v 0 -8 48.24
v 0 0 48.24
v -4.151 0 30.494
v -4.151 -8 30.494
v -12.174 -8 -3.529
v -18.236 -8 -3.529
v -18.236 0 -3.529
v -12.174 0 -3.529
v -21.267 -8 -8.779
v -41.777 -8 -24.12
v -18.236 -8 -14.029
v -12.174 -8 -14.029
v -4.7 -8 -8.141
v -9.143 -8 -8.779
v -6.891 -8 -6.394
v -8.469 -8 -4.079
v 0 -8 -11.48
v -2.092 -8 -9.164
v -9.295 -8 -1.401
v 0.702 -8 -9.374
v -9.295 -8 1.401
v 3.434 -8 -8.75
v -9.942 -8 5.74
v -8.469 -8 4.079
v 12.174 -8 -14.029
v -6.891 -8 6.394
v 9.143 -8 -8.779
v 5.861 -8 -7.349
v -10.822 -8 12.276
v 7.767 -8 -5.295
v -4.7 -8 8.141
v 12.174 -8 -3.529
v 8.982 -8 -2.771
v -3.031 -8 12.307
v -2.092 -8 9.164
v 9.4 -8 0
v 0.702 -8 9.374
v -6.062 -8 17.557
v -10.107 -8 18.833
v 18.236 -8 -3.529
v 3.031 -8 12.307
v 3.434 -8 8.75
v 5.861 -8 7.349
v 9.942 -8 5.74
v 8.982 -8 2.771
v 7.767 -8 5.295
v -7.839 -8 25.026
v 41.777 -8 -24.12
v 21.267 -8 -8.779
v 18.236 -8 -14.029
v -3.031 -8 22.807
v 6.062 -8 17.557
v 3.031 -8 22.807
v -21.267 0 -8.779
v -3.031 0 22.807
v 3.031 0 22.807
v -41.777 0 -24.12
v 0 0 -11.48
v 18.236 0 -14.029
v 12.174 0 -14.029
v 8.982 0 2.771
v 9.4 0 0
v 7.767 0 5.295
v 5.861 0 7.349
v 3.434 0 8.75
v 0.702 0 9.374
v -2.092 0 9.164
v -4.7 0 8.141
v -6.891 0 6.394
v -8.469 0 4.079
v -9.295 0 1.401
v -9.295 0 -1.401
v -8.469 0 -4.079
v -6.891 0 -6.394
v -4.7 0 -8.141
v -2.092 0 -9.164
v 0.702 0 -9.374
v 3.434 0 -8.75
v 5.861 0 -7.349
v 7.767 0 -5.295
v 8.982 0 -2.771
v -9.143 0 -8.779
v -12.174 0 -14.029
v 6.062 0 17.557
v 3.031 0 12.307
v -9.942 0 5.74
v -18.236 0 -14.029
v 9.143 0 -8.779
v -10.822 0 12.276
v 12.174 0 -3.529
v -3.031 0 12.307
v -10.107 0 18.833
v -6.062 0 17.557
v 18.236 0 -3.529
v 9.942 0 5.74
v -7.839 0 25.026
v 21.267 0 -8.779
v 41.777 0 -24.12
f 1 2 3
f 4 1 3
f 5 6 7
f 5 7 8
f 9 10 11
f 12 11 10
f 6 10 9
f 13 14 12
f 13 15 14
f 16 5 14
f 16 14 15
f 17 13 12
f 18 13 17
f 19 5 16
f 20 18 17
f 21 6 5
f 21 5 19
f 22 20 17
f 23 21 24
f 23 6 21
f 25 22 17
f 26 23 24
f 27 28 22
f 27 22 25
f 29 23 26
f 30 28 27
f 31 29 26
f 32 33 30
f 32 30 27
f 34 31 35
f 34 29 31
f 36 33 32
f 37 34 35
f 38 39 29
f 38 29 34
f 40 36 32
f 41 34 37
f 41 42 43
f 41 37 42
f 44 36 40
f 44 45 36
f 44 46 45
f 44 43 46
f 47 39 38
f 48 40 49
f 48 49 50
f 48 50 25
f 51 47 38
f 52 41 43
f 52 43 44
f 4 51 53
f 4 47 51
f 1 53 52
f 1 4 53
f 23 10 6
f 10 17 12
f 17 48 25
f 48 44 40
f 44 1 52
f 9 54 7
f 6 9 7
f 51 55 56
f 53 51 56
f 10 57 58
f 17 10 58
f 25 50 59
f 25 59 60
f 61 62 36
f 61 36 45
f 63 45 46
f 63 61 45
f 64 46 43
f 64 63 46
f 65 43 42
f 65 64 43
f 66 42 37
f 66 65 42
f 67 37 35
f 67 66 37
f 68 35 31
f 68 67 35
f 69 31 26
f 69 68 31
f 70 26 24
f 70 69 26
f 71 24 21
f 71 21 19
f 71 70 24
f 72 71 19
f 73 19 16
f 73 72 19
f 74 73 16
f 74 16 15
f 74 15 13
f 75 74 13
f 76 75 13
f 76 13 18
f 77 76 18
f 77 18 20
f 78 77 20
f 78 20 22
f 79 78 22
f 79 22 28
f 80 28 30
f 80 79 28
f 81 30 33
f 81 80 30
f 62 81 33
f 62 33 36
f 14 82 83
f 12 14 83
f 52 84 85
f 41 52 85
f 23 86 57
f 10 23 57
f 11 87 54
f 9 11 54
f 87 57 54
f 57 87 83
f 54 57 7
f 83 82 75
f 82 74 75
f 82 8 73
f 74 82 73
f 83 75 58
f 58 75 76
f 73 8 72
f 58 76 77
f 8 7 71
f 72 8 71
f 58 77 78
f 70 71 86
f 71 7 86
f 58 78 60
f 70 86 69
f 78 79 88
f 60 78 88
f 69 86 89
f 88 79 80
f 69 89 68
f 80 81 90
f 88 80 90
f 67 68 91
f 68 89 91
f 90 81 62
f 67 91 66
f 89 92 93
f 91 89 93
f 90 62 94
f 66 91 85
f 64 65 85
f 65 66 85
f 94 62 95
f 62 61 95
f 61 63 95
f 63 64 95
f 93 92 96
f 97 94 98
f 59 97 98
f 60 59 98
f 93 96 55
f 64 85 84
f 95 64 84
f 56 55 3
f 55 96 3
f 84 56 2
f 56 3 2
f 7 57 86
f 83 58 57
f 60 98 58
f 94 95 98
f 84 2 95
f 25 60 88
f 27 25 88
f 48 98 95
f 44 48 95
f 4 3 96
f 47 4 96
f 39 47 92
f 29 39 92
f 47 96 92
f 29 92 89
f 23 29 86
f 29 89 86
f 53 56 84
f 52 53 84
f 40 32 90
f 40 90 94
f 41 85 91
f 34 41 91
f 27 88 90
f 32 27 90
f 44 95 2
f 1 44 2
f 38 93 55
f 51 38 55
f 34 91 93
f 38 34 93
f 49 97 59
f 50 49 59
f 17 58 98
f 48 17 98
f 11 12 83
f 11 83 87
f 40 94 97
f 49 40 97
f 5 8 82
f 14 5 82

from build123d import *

# Parameters (mm, degrees)
F0_R     = 9.4
F1_DEPTH = 8
F2_DEPTH = 8


# Not quite as in the source:
# - a feature names something its author has since deleted; it is built from what else it names


with BuildPart() as f1:
    # F0 (on Front) → F1 (new body)
    with BuildSketch(Plane.XZ):
        Polygon((-4.1513990878, 30.4938093078), (-9.9419574161, 5.7399917905), (-41.7774577923, -24.1202265024), (0, -11.4799835809), (41.7774577923, -24.1202265024), (9.9419574161, 5.7399917905), (0, 48.2404530048), align=None)
        Polygon((-12.1738227533, -14.0285603702), (-18.2360010358, -14.0285603702), (-21.267090177, -8.7785599753), (-18.2360010358, -3.5285595804), (-12.1738227533, -3.5285595804), (-9.1427336121, -8.7785599753), align=None, mode=Mode.SUBTRACT)
        Polygon((18.2360010358, -3.5285595804), (21.267090177, -8.7785599753), (18.2360010358, -14.0285603702), (12.1738227533, -14.0285603702), (9.1427336121, -8.7785599753), (12.1738227533, -3.5285595804), align=None, mode=Mode.SUBTRACT)
        Circle(F0_R, mode=Mode.SUBTRACT)
        Polygon((6.0621782825, 17.5571199507), (3.0310891412, 12.3071195558), (-3.0310891412, 12.3071195558), (-6.0621782825, 17.5571199507), (-3.0310891412, 22.8071203455), (3.0310891412, 22.8071203455), align=None, mode=Mode.SUBTRACT)
    extrude(amount=F1_DEPTH)

    # F0 (on Front) → F2 (join)
    with BuildSketch(Plane.XZ):
        with BuildLine():
            ThreePointArc((-4.1513990878, 30.4938093078), (-10.107126805, 18.8328186432), (-9.9419574161, 5.7399917905))
            Line((-9.9419574161, 5.7399917905), (-4.1513990878, 30.4938093078))
        make_face()
        Polygon((-4.1513990878, 30.4938093078), (-9.9419574161, 5.7399917905), (-41.7774577923, -24.1202265024), (0, -11.4799835809), (41.7774577923, -24.1202265024), (9.9419574161, 5.7399917905), (0, 48.2404530048), align=None)
        Polygon((-12.1738227533, -14.0285603702), (-18.2360010358, -14.0285603702), (-21.267090177, -8.7785599753), (-18.2360010358, -3.5285595804), (-12.1738227533, -3.5285595804), (-9.1427336121, -8.7785599753), align=None, mode=Mode.SUBTRACT)
        Polygon((18.2360010358, -3.5285595804), (21.267090177, -8.7785599753), (18.2360010358, -14.0285603702), (12.1738227533, -14.0285603702), (9.1427336121, -8.7785599753), (12.1738227533, -3.5285595804), align=None, mode=Mode.SUBTRACT)
        Circle(F0_R, mode=Mode.SUBTRACT)
        Polygon((6.0621782825, 17.5571199507), (3.0310891412, 12.3071195558), (-3.0310891412, 12.3071195558), (-6.0621782825, 17.5571199507), (-3.0310891412, 22.8071203455), (3.0310891412, 22.8071203455), align=None, mode=Mode.SUBTRACT)
    extrude(amount=F2_DEPTH)


solid = f1.part
